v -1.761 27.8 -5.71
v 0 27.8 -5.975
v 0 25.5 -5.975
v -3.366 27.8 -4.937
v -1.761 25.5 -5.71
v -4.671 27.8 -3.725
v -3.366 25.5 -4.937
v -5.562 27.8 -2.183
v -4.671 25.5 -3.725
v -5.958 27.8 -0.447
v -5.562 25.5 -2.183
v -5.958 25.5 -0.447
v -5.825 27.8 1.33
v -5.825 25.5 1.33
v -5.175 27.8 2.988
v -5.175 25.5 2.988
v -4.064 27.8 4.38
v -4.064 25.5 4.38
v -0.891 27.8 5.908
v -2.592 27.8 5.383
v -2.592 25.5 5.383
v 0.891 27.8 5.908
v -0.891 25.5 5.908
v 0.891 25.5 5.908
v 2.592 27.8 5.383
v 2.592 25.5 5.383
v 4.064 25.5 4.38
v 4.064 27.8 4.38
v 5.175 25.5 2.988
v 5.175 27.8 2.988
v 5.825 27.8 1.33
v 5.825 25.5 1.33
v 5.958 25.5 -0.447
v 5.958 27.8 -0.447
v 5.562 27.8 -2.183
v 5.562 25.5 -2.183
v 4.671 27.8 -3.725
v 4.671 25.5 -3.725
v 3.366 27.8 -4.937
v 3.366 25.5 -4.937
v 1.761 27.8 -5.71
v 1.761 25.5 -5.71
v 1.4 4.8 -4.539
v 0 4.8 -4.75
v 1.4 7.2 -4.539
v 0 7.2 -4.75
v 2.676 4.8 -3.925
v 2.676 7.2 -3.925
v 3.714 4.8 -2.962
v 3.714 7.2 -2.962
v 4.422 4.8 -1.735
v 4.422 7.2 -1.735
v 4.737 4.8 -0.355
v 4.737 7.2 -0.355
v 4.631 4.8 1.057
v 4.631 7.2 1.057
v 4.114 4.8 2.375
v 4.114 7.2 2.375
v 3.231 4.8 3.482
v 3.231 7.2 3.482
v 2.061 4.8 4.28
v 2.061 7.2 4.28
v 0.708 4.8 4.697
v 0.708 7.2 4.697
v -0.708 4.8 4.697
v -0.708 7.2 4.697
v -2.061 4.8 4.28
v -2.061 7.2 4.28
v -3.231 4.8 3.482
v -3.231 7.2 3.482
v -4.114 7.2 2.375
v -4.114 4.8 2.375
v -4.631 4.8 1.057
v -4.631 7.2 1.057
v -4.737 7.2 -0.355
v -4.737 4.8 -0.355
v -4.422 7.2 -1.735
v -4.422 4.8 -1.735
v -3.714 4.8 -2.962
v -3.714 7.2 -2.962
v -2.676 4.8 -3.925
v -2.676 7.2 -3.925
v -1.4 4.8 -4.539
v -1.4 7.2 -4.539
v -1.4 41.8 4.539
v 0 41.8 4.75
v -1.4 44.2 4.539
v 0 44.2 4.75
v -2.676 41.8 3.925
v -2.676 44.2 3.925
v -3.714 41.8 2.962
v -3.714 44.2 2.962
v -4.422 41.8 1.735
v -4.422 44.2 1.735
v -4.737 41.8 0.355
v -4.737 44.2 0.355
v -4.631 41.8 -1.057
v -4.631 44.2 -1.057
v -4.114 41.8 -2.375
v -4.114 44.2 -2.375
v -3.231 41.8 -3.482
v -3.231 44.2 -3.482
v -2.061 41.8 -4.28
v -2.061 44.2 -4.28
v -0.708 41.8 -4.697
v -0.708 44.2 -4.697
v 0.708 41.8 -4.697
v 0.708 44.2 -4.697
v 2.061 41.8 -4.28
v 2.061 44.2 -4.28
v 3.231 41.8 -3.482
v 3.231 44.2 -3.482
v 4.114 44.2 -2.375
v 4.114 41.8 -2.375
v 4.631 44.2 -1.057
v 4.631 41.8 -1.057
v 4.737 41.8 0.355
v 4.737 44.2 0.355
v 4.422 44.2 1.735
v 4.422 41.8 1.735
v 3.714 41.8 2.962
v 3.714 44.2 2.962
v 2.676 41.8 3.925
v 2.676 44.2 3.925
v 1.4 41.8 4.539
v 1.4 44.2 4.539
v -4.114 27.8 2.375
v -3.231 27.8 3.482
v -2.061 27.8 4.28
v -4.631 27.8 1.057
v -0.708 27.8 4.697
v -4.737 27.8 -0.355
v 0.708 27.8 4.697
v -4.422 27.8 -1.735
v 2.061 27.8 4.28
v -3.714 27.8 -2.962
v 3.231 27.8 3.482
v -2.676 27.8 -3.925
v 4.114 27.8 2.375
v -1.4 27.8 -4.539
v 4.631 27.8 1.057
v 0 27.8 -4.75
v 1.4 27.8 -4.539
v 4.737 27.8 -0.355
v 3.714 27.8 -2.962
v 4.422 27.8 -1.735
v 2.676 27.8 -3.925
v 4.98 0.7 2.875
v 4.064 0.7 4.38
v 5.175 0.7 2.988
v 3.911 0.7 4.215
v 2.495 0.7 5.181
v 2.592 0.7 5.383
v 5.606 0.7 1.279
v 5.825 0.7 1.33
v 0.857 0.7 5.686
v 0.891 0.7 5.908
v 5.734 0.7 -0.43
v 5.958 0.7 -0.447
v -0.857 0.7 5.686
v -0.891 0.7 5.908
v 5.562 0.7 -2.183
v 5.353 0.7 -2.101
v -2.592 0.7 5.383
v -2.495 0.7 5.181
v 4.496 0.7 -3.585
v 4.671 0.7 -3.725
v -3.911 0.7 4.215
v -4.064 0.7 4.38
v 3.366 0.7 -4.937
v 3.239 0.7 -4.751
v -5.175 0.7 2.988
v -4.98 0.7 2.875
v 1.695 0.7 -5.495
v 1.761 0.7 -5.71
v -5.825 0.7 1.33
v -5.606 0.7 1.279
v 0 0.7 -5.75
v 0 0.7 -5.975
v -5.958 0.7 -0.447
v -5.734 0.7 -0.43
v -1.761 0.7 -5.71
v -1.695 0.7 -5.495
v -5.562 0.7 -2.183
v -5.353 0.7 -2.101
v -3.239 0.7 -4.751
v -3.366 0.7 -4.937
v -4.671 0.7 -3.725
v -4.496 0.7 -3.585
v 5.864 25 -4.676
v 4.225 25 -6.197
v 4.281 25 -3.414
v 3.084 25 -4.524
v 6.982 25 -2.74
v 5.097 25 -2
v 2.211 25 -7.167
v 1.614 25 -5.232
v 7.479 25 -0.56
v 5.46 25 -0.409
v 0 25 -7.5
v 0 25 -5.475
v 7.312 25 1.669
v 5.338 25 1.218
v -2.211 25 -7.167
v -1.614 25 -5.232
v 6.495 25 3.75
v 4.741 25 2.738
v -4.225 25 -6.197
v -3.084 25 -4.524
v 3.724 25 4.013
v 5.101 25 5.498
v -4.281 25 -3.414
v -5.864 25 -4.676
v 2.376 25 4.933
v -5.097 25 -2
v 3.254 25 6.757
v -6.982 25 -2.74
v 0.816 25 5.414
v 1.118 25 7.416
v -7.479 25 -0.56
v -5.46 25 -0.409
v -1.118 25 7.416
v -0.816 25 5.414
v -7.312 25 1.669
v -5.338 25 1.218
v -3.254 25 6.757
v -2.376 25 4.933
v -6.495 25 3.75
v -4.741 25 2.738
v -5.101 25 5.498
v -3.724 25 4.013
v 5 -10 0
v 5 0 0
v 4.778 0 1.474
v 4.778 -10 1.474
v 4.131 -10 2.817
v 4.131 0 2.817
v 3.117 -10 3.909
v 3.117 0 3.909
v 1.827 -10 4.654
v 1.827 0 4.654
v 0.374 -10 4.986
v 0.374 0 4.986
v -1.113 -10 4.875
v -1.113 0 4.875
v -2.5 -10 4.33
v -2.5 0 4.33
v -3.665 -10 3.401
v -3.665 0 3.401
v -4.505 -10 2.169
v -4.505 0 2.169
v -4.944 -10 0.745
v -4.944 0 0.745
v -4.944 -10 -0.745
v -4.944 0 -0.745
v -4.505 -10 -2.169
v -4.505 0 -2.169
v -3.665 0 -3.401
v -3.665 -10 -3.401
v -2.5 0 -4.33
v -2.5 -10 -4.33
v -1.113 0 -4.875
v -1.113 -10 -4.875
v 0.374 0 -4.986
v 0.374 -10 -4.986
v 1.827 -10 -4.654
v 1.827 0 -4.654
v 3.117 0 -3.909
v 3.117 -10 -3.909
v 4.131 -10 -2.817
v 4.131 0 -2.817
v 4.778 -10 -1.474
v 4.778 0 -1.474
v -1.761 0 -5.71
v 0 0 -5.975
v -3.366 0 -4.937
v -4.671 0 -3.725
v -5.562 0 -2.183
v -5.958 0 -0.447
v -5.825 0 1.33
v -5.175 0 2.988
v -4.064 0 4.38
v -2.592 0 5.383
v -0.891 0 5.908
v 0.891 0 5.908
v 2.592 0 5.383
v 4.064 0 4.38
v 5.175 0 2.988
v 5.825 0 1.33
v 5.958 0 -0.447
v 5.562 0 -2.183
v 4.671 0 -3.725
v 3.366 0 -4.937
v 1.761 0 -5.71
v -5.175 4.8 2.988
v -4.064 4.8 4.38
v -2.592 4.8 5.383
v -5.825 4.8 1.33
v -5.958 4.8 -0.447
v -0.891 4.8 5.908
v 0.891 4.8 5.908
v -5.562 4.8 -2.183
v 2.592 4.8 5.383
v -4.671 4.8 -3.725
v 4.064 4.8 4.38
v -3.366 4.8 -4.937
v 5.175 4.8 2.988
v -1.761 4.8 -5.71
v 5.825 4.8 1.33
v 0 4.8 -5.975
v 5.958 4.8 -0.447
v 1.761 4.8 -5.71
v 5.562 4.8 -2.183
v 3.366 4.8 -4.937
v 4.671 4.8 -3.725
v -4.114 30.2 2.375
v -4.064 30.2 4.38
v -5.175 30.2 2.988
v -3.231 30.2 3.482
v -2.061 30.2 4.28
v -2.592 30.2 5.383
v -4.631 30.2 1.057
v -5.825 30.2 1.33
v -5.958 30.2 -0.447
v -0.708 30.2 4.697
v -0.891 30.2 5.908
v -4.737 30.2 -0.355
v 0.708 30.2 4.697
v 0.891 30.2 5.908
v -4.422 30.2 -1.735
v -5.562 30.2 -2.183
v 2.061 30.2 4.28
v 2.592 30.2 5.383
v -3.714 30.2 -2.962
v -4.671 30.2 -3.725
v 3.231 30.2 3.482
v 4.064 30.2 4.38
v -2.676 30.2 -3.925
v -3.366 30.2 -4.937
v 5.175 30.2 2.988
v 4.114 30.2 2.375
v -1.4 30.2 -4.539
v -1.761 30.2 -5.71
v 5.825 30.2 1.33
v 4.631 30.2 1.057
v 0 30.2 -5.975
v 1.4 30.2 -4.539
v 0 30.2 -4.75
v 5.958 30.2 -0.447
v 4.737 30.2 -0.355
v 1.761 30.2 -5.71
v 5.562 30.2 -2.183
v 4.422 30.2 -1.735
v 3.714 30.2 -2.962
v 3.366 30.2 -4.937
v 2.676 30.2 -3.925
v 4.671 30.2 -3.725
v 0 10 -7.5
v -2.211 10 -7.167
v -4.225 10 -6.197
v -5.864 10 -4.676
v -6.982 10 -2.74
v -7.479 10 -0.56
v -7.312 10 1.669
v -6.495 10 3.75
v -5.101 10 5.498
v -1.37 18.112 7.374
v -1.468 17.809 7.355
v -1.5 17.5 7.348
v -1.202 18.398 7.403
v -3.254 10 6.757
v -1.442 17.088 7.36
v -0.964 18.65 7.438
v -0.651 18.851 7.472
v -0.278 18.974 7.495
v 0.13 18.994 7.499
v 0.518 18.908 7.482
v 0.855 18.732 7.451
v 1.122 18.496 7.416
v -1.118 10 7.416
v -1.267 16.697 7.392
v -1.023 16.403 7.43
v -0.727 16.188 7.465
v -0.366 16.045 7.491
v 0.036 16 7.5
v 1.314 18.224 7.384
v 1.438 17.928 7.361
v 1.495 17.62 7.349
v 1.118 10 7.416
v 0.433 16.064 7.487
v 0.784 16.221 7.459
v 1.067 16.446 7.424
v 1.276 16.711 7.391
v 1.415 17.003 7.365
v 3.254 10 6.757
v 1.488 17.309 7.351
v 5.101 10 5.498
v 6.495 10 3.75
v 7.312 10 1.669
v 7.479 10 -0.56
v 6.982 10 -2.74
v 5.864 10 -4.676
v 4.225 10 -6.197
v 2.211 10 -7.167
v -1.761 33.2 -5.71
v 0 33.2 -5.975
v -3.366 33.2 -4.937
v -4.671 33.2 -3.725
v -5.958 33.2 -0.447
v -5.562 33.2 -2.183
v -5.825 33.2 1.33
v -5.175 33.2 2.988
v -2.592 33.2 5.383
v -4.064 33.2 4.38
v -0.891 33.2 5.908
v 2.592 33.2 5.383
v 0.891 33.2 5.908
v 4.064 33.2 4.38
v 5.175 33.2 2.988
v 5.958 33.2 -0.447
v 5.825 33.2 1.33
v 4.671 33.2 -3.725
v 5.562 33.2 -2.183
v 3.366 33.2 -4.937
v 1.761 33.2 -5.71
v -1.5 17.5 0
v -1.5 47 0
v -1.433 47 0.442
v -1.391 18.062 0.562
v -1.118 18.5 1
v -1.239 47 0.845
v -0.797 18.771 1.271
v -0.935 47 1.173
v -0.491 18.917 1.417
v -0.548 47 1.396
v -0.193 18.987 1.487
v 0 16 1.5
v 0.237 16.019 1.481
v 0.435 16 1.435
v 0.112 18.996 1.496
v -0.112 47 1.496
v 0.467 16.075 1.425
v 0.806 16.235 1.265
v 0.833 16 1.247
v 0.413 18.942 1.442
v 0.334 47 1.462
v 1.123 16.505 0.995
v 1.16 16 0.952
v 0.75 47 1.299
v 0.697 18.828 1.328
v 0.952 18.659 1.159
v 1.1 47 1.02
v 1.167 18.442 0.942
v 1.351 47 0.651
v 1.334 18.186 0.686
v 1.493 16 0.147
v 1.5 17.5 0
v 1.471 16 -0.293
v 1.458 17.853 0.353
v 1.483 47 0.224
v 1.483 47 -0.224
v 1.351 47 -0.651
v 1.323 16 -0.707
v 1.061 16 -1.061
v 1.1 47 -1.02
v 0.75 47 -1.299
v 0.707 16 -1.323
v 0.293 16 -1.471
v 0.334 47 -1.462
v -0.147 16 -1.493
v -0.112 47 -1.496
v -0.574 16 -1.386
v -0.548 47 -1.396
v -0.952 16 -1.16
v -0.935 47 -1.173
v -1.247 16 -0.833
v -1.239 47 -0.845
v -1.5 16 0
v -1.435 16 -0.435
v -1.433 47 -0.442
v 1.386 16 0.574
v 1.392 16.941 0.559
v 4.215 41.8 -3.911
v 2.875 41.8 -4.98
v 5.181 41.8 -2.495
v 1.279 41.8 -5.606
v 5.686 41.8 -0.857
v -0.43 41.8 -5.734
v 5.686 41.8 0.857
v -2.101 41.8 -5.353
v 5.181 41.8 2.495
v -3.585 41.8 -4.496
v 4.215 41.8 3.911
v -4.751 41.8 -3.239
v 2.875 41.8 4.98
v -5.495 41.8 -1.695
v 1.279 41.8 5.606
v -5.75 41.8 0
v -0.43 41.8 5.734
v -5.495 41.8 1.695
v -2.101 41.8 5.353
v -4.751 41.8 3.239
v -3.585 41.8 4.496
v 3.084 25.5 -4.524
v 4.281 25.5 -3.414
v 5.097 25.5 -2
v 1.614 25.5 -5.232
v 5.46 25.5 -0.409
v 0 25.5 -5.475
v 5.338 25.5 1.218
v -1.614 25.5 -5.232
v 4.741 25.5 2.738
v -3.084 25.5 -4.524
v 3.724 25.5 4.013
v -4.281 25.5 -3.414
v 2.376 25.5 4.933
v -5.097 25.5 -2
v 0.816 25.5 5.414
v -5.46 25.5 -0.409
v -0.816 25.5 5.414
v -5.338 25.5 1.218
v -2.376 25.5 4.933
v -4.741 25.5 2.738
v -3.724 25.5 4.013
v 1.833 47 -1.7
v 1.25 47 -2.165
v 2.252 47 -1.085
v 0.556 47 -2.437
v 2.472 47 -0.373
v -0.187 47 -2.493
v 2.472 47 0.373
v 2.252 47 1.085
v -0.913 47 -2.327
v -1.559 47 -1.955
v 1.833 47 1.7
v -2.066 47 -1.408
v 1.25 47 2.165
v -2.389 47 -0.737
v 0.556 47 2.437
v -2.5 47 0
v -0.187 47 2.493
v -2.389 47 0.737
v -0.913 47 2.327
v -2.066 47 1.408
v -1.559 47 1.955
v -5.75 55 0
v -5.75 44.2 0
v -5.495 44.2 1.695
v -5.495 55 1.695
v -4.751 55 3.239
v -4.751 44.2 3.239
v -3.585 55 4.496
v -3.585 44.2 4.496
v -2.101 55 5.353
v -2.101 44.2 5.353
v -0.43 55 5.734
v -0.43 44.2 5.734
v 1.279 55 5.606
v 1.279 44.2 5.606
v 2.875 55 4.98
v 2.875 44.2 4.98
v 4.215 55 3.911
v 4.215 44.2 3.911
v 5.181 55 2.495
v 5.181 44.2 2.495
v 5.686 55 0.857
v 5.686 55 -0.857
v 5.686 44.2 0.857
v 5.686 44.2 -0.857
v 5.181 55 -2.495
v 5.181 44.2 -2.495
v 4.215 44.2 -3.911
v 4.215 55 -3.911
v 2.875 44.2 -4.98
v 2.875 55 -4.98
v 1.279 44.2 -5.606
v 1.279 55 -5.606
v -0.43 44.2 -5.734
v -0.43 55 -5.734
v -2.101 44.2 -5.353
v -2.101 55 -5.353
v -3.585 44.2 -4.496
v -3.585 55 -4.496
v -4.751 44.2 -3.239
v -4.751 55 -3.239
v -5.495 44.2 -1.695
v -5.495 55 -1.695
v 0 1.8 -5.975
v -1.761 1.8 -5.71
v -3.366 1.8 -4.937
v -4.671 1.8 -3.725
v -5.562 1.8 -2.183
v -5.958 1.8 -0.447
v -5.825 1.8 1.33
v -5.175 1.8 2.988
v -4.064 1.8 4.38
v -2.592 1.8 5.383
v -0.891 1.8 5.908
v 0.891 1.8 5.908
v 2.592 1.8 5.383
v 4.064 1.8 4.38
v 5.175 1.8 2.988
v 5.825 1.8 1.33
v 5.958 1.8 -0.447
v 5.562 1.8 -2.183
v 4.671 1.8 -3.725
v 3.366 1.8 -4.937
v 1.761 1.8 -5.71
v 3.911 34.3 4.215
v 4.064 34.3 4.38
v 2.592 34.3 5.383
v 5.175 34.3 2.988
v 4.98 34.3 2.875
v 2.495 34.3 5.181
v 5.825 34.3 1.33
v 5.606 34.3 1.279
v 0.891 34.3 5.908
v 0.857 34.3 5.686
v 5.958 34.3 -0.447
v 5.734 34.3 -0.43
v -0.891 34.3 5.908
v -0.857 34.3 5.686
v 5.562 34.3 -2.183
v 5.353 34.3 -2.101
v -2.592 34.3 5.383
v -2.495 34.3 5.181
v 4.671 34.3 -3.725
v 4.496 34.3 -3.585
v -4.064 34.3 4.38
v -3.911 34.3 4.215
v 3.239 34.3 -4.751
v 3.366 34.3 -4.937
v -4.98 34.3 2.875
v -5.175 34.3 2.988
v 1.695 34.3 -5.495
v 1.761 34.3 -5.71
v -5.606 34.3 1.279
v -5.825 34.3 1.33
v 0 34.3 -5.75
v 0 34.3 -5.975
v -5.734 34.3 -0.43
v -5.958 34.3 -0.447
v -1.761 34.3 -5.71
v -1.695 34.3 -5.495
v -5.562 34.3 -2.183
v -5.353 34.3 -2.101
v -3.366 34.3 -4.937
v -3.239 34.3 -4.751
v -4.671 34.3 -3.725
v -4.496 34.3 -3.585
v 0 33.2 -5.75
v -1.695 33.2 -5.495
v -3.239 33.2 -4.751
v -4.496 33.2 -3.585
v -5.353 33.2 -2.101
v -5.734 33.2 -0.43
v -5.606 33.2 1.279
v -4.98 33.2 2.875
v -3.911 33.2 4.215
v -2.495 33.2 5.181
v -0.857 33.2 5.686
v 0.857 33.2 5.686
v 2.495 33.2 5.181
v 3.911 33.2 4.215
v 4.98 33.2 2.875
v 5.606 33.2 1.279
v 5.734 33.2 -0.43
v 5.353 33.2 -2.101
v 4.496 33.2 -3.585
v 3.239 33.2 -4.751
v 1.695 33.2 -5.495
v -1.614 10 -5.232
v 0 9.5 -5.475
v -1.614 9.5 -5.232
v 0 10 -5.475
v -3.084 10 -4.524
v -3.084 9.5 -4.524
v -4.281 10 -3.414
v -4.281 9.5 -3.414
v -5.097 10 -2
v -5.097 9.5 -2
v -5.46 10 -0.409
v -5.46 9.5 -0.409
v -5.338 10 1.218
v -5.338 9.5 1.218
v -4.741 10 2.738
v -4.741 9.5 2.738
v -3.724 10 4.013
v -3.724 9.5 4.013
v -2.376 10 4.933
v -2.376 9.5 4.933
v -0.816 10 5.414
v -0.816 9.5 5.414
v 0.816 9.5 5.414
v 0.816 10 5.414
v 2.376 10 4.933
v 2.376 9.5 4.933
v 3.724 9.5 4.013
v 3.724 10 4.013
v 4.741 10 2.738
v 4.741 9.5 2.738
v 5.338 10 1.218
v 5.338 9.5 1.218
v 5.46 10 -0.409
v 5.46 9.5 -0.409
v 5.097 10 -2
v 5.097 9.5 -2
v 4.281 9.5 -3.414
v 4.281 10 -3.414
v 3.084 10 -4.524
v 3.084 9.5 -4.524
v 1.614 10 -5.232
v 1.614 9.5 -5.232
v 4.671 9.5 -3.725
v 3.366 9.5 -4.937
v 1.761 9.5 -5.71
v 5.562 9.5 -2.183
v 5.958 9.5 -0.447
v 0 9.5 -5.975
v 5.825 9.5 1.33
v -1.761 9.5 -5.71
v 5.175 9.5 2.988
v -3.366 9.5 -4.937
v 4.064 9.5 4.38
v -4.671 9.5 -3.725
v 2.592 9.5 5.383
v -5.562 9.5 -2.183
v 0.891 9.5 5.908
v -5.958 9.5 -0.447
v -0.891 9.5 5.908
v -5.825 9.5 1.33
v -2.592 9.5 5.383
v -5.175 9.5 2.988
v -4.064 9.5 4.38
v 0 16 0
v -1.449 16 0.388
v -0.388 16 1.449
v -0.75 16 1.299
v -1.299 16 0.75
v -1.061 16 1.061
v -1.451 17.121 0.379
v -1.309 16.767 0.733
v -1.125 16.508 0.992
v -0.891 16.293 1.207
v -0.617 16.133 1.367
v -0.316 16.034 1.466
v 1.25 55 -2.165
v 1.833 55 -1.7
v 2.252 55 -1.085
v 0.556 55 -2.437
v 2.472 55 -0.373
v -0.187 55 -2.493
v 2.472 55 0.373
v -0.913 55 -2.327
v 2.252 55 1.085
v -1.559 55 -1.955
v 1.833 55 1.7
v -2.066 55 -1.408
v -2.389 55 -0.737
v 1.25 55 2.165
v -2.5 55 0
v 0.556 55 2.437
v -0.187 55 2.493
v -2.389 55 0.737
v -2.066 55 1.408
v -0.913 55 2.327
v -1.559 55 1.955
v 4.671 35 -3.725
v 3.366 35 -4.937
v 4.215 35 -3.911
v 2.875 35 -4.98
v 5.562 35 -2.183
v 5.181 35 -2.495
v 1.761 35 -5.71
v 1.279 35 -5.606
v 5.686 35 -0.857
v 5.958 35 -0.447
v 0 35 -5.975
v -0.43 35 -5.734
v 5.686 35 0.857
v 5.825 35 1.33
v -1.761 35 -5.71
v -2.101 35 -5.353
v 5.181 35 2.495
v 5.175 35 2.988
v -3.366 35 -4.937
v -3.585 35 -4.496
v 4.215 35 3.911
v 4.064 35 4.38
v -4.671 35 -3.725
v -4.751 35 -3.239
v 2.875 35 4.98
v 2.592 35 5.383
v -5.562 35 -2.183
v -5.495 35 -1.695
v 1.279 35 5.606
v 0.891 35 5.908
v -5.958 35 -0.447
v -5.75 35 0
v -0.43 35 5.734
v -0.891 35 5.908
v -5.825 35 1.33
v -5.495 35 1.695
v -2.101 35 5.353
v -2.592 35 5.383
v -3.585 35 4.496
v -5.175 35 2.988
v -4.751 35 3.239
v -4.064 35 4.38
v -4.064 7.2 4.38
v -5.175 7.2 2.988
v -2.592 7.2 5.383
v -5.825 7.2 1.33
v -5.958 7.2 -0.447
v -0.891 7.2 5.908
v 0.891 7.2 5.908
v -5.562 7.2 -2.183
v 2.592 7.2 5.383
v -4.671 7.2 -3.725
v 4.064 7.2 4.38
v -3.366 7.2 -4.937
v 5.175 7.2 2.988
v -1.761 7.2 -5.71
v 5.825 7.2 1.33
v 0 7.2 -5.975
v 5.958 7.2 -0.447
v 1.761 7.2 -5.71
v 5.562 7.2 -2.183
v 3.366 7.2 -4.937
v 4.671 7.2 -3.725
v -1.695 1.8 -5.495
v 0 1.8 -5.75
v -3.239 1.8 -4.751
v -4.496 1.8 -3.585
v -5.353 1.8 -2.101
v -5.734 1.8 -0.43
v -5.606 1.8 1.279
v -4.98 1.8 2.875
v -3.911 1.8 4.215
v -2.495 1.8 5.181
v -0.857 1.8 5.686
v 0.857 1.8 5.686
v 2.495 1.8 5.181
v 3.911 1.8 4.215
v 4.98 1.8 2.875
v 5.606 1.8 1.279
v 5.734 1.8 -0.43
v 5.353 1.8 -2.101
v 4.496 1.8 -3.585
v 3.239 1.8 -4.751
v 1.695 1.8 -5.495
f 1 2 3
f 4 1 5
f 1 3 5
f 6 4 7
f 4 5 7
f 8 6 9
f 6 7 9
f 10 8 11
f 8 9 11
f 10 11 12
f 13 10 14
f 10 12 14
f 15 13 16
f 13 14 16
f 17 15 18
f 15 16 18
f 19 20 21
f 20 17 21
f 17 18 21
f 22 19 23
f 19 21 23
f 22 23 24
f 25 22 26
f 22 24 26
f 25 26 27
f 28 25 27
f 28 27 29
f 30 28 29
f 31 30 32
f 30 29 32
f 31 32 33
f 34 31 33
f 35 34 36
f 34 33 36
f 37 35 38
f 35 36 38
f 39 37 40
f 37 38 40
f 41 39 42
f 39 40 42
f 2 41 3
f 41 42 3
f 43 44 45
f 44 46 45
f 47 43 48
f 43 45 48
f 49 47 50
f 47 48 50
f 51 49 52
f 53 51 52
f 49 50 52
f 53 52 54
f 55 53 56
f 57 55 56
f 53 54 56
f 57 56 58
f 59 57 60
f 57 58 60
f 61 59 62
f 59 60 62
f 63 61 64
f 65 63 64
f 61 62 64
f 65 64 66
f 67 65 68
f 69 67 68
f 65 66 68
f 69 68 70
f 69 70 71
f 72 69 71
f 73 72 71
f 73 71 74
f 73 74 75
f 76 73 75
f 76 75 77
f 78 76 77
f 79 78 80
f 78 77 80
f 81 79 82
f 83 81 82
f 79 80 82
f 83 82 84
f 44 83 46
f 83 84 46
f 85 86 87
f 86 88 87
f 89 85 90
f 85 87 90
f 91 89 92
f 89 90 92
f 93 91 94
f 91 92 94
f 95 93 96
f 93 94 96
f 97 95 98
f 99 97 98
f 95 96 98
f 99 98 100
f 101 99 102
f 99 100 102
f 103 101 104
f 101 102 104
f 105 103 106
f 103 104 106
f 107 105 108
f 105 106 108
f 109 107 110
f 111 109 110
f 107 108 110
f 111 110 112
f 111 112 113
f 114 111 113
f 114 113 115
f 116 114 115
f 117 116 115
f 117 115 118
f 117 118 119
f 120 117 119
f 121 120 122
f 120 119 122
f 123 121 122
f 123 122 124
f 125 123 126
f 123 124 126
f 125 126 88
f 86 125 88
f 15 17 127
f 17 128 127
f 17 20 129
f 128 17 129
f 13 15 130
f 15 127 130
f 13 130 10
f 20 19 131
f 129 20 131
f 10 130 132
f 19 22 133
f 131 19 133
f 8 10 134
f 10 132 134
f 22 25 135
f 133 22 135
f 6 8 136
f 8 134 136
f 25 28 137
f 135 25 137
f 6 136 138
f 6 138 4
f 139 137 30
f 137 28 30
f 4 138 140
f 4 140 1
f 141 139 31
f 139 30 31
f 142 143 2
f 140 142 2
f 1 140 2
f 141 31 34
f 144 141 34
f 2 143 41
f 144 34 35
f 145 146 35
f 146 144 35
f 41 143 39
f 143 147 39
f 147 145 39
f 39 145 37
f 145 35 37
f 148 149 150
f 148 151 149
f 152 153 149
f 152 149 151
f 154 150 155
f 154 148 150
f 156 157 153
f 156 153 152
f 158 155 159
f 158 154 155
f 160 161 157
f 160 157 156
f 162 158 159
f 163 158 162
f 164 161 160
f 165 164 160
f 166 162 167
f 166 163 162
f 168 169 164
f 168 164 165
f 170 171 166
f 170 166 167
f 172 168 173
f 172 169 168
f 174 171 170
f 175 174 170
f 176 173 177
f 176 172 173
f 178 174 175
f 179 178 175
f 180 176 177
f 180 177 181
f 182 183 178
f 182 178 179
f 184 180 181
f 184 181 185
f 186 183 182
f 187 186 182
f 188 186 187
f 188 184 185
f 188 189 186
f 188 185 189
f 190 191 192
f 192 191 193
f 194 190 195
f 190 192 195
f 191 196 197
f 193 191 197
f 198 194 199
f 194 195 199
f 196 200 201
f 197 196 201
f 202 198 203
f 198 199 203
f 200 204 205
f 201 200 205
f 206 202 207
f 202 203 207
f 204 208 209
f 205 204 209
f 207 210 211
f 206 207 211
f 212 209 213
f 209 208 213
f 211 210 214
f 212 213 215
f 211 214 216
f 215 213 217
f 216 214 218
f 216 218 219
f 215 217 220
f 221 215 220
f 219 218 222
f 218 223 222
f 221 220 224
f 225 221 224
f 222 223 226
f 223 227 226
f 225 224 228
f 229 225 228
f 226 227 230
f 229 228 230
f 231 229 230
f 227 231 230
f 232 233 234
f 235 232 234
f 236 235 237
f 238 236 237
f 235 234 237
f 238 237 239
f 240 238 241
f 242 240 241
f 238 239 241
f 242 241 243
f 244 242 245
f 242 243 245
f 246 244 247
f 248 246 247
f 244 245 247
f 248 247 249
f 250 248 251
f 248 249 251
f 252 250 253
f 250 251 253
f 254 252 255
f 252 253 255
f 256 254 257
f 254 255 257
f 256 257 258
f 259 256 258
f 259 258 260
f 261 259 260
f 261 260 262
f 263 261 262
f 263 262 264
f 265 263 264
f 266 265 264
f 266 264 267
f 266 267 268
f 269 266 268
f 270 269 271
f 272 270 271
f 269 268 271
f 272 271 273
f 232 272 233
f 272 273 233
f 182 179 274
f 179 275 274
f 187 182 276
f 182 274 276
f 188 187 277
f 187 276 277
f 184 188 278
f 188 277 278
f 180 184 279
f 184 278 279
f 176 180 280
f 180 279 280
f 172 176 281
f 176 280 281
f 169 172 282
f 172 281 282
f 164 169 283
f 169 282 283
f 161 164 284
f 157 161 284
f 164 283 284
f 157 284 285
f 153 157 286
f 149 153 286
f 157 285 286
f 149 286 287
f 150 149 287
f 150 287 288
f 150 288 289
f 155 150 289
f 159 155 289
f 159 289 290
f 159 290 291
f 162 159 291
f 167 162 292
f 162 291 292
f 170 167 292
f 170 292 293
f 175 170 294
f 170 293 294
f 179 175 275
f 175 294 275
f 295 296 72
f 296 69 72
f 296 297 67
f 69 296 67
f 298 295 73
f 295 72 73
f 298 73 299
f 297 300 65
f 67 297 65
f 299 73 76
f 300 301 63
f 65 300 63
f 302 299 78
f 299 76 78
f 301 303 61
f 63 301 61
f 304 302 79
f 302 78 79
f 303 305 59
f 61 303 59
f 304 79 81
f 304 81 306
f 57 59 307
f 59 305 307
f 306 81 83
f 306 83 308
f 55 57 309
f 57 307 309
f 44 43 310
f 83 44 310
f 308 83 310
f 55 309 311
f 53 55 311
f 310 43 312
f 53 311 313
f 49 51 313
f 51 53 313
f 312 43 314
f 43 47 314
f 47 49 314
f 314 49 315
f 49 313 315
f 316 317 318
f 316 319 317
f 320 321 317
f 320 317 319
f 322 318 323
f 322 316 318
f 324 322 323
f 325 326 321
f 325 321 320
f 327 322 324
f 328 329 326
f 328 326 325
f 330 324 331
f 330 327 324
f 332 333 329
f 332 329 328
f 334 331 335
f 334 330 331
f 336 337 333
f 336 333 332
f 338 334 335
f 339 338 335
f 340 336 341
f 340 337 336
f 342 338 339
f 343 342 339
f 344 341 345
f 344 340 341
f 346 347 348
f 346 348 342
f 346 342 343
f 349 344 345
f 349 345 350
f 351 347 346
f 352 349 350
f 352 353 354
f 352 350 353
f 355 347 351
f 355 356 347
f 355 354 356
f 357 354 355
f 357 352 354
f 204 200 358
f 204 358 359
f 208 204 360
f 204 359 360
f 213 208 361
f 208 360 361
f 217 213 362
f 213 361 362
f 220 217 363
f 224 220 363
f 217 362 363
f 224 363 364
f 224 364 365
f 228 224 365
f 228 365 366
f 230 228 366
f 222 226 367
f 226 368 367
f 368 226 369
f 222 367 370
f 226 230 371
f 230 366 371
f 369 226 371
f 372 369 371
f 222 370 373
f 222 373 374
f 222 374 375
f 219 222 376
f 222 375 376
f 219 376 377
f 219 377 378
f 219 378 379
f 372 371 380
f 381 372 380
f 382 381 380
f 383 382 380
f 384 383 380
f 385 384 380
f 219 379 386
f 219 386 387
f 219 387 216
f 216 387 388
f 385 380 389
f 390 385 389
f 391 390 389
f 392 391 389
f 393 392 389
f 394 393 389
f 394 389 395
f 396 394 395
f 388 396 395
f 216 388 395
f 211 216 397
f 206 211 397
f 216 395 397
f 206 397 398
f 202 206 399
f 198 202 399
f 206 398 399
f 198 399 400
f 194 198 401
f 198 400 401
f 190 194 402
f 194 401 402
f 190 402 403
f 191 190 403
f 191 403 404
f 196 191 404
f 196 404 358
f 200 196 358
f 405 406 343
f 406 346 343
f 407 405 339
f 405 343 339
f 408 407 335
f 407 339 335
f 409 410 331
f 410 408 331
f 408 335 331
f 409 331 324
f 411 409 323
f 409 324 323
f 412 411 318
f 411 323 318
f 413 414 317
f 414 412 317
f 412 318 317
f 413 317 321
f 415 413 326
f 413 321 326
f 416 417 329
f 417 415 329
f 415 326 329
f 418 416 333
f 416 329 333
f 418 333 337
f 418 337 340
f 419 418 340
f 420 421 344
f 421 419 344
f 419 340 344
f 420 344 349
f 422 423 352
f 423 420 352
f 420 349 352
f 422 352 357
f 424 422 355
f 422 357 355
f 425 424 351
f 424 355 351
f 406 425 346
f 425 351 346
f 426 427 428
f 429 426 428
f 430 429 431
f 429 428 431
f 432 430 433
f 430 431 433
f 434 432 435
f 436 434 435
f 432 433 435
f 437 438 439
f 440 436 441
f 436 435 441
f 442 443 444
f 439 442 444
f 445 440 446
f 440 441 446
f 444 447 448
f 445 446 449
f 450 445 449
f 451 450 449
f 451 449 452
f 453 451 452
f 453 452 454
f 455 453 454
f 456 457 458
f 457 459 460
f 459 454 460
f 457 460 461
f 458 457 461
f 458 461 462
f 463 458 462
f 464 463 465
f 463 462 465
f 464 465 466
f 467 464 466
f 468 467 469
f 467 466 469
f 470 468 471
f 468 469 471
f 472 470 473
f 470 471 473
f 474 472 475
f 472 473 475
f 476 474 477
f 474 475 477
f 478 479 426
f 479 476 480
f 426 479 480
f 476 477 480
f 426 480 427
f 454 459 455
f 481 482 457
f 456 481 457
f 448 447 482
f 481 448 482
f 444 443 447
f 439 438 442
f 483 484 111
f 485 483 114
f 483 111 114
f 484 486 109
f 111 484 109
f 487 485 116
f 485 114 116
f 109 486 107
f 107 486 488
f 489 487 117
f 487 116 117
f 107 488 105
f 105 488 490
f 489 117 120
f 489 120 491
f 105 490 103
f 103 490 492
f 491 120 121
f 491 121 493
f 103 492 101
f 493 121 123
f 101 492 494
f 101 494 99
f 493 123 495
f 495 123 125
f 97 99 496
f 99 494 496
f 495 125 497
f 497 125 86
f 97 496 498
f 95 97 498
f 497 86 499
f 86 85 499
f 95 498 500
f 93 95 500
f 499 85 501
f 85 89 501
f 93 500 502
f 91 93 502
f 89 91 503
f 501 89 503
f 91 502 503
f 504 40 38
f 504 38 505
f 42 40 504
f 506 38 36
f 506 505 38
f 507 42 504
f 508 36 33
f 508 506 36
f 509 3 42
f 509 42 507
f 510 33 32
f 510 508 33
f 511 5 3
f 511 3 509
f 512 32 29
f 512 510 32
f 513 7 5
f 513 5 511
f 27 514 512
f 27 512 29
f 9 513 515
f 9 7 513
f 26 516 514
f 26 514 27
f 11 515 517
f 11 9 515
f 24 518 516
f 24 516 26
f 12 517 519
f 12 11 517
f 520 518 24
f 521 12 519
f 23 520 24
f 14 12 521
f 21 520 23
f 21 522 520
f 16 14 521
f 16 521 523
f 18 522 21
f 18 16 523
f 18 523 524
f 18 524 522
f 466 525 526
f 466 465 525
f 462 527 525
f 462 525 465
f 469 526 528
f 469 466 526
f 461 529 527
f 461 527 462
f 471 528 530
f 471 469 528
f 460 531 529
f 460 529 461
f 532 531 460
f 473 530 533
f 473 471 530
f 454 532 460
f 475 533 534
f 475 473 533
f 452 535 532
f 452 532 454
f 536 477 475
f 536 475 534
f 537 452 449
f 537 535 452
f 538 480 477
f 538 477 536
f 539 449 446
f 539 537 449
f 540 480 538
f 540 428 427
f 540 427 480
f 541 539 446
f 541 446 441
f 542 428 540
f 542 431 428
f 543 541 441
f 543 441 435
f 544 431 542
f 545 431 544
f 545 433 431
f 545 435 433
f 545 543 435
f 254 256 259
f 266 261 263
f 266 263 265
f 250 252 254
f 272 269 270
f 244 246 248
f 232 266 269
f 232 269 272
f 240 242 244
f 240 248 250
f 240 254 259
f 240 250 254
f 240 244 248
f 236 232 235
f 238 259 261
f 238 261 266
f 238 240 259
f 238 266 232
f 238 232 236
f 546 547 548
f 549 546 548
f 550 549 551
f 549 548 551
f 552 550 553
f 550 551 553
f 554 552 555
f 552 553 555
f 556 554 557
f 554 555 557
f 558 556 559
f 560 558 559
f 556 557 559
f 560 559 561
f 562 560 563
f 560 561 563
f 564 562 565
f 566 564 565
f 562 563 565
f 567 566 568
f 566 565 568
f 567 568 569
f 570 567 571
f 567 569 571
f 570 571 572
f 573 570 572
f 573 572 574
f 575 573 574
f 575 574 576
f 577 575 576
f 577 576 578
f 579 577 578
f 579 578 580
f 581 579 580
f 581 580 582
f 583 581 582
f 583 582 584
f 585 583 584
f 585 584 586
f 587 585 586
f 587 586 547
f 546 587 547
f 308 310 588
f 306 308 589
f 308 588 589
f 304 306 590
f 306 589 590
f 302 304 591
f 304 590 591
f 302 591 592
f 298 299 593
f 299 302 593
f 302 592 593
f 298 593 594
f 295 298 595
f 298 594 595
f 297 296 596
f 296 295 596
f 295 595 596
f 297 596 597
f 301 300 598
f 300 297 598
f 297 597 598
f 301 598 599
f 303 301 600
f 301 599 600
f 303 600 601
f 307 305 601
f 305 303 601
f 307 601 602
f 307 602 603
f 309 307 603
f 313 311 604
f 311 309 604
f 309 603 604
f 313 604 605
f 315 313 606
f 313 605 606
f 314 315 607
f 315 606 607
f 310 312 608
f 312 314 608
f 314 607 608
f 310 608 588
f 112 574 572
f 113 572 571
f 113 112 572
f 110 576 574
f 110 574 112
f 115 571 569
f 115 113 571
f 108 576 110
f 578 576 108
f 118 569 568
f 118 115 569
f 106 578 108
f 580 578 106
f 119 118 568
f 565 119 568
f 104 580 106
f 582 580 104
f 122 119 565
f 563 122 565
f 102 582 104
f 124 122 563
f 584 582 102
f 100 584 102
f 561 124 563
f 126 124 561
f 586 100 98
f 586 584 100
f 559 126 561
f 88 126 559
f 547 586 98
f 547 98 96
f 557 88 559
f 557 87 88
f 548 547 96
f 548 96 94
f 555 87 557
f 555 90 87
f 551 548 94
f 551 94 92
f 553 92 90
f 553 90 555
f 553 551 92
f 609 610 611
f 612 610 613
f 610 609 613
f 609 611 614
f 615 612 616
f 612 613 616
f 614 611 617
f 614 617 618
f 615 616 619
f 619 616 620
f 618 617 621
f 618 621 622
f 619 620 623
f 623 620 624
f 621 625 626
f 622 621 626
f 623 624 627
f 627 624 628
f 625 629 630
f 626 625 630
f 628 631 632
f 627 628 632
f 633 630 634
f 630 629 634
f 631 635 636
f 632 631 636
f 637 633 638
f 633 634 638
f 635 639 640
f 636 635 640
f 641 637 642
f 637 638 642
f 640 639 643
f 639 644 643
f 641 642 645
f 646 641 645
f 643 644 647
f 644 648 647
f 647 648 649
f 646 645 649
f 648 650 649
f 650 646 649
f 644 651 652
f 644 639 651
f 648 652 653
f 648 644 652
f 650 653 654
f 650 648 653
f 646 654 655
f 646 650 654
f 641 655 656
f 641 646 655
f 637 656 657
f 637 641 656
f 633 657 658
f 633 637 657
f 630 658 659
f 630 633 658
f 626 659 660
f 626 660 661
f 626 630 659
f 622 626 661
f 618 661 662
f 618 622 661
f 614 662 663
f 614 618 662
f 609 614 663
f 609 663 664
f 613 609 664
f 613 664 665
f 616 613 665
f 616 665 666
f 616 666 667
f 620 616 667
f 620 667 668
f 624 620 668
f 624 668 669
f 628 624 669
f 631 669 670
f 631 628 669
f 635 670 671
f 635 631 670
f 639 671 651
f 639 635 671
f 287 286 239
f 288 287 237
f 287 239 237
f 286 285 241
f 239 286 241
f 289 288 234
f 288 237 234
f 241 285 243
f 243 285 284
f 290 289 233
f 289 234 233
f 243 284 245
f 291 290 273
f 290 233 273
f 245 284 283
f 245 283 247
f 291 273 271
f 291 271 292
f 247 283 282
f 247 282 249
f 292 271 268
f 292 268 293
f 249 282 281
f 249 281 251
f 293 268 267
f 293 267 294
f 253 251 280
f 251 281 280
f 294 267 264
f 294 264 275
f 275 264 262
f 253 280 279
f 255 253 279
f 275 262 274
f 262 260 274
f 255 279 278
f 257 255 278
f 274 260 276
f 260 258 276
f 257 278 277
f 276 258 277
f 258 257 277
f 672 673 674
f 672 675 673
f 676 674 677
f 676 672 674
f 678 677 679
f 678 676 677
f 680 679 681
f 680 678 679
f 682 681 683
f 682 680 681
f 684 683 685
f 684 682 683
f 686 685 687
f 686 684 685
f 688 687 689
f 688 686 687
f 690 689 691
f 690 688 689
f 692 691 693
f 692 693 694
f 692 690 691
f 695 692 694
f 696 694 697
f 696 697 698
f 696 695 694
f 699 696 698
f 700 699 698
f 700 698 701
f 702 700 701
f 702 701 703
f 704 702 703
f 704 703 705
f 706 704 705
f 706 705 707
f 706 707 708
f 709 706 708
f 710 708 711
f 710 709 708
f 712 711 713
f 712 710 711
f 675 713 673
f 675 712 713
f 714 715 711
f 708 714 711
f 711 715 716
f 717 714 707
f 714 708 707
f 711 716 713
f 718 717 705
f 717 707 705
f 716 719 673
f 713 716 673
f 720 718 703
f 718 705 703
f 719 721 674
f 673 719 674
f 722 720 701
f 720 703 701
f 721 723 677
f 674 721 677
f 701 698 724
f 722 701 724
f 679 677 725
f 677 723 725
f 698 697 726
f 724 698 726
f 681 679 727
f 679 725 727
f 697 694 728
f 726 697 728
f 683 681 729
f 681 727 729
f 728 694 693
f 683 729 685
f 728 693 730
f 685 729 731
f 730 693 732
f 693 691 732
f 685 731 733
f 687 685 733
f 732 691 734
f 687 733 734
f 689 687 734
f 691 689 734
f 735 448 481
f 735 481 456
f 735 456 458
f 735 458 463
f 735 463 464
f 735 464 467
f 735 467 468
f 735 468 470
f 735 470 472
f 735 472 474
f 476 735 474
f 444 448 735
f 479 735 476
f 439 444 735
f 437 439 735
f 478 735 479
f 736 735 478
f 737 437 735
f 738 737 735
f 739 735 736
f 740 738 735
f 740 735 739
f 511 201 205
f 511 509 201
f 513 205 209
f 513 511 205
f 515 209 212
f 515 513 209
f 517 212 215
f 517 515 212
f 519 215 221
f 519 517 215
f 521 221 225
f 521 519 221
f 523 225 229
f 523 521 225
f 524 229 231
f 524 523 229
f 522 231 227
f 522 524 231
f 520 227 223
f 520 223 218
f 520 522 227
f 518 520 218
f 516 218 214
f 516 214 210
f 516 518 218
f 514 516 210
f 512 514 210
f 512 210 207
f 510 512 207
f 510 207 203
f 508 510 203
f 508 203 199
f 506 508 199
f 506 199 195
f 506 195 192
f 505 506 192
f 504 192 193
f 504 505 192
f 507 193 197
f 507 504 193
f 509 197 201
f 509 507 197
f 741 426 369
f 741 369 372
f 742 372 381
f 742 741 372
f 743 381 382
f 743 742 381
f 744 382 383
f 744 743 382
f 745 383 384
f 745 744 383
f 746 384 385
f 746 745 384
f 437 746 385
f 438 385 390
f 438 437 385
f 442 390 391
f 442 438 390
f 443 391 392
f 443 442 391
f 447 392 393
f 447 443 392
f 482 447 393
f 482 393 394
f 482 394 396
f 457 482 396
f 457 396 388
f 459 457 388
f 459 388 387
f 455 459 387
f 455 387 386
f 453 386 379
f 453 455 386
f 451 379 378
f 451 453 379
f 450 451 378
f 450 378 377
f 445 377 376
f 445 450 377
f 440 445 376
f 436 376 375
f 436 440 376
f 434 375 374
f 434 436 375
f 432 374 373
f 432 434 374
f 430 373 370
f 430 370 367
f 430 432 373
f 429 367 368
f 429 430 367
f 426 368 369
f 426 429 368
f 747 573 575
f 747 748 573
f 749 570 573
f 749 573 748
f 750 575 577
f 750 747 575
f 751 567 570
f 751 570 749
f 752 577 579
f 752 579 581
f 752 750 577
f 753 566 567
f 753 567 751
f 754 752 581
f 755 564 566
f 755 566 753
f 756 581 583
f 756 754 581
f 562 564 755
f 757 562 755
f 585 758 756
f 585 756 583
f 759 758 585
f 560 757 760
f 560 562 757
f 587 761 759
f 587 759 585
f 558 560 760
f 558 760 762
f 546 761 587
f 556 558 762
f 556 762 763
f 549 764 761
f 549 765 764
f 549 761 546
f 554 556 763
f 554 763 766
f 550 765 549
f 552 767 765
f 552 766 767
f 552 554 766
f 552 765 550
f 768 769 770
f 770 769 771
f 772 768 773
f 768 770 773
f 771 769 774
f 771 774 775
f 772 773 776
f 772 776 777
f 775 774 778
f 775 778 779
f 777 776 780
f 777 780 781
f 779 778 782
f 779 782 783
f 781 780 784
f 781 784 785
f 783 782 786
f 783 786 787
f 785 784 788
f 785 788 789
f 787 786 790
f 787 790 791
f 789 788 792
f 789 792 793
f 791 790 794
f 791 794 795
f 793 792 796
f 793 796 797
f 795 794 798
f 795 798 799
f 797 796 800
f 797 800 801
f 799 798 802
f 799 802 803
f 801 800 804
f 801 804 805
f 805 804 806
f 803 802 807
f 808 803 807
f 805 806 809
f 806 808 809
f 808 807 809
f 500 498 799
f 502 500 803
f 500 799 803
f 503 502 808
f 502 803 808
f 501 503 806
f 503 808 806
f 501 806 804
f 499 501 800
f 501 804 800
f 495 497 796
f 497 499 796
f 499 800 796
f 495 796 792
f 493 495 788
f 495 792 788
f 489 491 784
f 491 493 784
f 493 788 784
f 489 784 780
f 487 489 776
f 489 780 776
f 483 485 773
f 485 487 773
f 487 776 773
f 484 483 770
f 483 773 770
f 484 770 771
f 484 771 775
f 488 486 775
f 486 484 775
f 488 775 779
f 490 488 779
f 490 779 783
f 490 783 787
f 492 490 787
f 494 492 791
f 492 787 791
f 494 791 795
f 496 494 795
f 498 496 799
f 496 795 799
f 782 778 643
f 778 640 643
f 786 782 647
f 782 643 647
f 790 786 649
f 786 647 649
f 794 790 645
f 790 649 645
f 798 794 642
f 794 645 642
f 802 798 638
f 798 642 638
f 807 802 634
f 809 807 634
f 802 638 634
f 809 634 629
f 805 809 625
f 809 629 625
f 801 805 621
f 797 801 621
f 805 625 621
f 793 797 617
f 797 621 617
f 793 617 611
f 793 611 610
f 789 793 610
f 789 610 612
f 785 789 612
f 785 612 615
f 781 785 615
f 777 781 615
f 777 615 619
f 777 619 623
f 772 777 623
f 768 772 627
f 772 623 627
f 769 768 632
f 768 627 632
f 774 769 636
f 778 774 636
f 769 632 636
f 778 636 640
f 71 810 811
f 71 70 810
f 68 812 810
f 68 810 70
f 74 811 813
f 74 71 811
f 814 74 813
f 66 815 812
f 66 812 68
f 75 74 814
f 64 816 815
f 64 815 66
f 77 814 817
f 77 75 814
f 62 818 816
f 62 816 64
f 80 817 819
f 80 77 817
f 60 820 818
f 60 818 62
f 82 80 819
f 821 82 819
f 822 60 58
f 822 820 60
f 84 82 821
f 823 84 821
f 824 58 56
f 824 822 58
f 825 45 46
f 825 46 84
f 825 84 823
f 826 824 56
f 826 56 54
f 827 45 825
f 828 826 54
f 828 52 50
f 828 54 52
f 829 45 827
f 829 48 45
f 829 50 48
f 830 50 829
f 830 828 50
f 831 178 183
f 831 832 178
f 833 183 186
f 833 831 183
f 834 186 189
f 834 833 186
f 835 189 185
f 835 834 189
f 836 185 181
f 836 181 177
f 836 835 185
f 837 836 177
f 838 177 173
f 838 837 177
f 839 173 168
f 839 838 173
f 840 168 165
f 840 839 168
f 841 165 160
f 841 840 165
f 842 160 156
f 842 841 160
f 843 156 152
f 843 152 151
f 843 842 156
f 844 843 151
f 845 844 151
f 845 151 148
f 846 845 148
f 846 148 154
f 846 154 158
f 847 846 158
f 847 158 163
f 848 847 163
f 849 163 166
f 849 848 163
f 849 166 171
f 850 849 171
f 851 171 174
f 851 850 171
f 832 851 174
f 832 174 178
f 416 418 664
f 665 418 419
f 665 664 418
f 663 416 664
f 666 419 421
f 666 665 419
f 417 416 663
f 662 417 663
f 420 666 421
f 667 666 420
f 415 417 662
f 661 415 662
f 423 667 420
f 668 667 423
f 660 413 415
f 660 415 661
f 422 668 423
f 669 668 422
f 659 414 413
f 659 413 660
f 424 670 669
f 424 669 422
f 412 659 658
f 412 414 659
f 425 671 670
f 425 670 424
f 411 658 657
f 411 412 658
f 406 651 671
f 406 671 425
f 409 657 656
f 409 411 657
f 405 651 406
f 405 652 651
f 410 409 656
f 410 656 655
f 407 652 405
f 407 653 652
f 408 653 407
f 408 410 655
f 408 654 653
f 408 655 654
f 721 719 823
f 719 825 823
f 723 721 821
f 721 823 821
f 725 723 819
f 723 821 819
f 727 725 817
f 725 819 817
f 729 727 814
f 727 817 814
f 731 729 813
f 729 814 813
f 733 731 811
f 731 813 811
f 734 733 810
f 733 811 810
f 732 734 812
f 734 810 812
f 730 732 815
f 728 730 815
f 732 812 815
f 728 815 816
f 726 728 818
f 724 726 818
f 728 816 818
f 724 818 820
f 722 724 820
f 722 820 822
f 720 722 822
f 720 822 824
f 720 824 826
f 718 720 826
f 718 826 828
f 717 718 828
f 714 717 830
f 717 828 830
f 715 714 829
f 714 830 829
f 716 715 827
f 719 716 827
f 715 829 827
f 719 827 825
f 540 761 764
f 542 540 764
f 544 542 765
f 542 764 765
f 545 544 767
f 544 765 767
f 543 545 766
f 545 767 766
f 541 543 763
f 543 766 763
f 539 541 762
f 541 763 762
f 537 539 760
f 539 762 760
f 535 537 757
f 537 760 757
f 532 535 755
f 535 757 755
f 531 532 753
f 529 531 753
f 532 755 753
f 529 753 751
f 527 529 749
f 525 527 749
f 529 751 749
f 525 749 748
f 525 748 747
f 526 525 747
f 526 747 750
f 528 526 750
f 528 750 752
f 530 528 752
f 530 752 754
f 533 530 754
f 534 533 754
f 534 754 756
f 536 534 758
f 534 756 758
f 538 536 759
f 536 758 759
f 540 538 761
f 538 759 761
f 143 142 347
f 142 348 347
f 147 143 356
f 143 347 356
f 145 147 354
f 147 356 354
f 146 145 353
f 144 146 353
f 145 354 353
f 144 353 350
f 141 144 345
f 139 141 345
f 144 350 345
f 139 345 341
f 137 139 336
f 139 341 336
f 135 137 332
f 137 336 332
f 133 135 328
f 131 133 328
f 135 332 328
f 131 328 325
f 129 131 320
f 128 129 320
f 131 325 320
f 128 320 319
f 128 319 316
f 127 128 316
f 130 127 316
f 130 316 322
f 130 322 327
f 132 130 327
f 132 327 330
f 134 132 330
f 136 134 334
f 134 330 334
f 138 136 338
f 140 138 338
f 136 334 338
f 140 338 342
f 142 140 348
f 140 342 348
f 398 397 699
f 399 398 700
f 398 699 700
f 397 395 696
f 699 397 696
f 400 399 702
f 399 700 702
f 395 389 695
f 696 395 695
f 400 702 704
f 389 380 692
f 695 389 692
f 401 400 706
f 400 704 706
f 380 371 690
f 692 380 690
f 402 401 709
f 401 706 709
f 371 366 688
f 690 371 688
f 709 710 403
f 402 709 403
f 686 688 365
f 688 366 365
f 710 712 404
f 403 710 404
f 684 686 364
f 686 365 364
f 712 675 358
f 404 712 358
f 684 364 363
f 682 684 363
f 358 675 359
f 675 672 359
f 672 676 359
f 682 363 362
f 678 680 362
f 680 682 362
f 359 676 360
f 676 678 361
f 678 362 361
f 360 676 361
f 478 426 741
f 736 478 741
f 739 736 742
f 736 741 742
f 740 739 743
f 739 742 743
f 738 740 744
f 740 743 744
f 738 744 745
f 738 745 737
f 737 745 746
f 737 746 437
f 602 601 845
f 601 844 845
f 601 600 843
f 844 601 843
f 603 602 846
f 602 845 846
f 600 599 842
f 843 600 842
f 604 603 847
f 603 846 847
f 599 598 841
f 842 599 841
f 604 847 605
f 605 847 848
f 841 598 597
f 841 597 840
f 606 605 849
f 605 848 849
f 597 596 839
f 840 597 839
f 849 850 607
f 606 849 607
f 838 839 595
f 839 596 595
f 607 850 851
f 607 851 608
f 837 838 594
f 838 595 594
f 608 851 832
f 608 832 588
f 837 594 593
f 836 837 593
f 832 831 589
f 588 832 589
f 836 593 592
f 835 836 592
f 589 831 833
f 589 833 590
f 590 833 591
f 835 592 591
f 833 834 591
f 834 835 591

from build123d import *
from build123d.topology import SkipClean

# Parameters (mm, degrees)
SKETCH3_W           = 1.225
SKETCH3_H           = 2.4
SKETCH4_R           = 1.5
CUT_EXTRUDE2_DEPTH  = 10
SKETCH5_R           = 5
BOSS_EXTRUDE1_DEPTH = 10
SKETCH6_W           = 0.5
SKETCH6_H           = 0.5
SKETCH7_R           = 5.75
BOSS_EXTRUDE2_DEPTH = 20
SKETCH9_R           = 1.5
CUT_EXTRUDE4_DEPTH  = 39
SKETCH10_W          = 1.225
SKETCH10_H          = 2.4
SKETCH12_W          = 0.25
SKETCH12_H          = 1.1
SKETCH12_W_2        = 0.225
SKETCH14_R          = 2.5
CUT_EXTRUDE8_DEPTH  = 8


with BuildPart() as part:
    # Sketch1 → Revolve1 (revolve)
    with BuildSketch(Plane.XY):
        Polygon((0, 35), (-5.975, 35), (-5.975, 25), (-7.5, 25), (-7.5, 10), (-5.975, 10), (-5.975, 0), (0, 0), align=None)
    revolve(axis=Axis((0, 0, 0), (0, 1, 0)))

    # Sketch3 → Cut-Revolve1 (revolve, cut)
    with BuildSketch(Plane(origin=(0, 0, 0), x_dir=(0, 0, -1), z_dir=(1, 0, 0))):
        with Locations((-5.3625, 29)):
            Rectangle(SKETCH3_W, SKETCH3_H)
        with Locations((-5.3625, 6)):
            Rectangle(SKETCH3_W, SKETCH3_H)
    revolve(axis=Axis((0, 35, 0), (0, -1, 0)), mode=Mode.SUBTRACT)

    # Sketch4 → Cut-Extrude2 (cut)
    with BuildSketch(Plane.XY):
        with Locations((0, 17.5)):
            Circle(SKETCH4_R)
    extrude(amount=CUT_EXTRUDE2_DEPTH, mode=Mode.SUBTRACT)

    # Sketch5 → Boss-Extrude1 (add)
    with BuildSketch(Plane.XZ):
        Circle(SKETCH5_R)
    extrude(amount=BOSS_EXTRUDE1_DEPTH)

    # Sketch6 → Cut-Revolve2 (revolve, cut)
    with BuildSketch(Plane(origin=(0, 0, 0), x_dir=(0, 0, -1), z_dir=(1, 0, 0))):
        with Locations((5.725, 9.75)):
            Rectangle(SKETCH6_W, SKETCH6_H)
        with Locations((5.725, 25.25)):
            Rectangle(SKETCH6_W, SKETCH6_H)
    revolve(axis=Axis((0, 0, 0), (0, 1, 0)), mode=Mode.SUBTRACT)

    # Sketch7 → Boss-Extrude2 (add)
    with BuildSketch(Plane(origin=(0, 35, 0), x_dir=(1, 0, 0), z_dir=(0, 1, 0))):
        Circle(SKETCH7_R)
    extrude(amount=BOSS_EXTRUDE2_DEPTH)

    # Sketch9 → Cut-Extrude4 (cut)
    with SkipClean():  # the faces are left unmerged after this step: merging them gives an invalid solid
        with BuildSketch(Plane(origin=(0, 55, 0), x_dir=(1, 0, 0), z_dir=(0, 1, 0))):
            Circle(SKETCH9_R)
        extrude(amount=-CUT_EXTRUDE4_DEPTH, mode=Mode.SUBTRACT)

    # Sketch10 → Cut-Revolve3 (revolve, cut)
    with SkipClean():  # the faces are left unmerged after this step: merging them gives an invalid solid
        with BuildSketch(Plane(origin=(0, 0, 0), x_dir=(0, 0, -1), z_dir=(1, 0, 0))):
            with Locations((-5.3625, 43)):
                Rectangle(SKETCH10_W, SKETCH10_H)
        revolve(axis=Axis((0, 55, 0), (0, -1, 0)), mode=Mode.SUBTRACT)

    # Sketch12 → Cut-Revolve4 (revolve, cut)
    with SkipClean():  # the faces are left unmerged after this step: merging them gives an invalid solid
        with BuildSketch(Plane.XY):
            with Locations((-5.875, 33.75)):
                Rectangle(SKETCH12_W, SKETCH12_H)
            with Locations((-5.8625, 1.25)):
                Rectangle(SKETCH12_W_2, SKETCH12_H)
        revolve(axis=Axis((0, 0, 0), (0, 1, 0)), mode=Mode.SUBTRACT)

    # Sketch14 → Cut-Extrude8 (cut)
    with SkipClean():  # the faces are left unmerged after this step: merging them gives an invalid solid
        with BuildSketch(Plane(origin=(0, 55, 0), x_dir=(1, 0, 0), z_dir=(0, 1, 0))):
            Circle(SKETCH14_R)
        extrude(amount=-CUT_EXTRUDE8_DEPTH, mode=Mode.SUBTRACT)


solid = part.part
